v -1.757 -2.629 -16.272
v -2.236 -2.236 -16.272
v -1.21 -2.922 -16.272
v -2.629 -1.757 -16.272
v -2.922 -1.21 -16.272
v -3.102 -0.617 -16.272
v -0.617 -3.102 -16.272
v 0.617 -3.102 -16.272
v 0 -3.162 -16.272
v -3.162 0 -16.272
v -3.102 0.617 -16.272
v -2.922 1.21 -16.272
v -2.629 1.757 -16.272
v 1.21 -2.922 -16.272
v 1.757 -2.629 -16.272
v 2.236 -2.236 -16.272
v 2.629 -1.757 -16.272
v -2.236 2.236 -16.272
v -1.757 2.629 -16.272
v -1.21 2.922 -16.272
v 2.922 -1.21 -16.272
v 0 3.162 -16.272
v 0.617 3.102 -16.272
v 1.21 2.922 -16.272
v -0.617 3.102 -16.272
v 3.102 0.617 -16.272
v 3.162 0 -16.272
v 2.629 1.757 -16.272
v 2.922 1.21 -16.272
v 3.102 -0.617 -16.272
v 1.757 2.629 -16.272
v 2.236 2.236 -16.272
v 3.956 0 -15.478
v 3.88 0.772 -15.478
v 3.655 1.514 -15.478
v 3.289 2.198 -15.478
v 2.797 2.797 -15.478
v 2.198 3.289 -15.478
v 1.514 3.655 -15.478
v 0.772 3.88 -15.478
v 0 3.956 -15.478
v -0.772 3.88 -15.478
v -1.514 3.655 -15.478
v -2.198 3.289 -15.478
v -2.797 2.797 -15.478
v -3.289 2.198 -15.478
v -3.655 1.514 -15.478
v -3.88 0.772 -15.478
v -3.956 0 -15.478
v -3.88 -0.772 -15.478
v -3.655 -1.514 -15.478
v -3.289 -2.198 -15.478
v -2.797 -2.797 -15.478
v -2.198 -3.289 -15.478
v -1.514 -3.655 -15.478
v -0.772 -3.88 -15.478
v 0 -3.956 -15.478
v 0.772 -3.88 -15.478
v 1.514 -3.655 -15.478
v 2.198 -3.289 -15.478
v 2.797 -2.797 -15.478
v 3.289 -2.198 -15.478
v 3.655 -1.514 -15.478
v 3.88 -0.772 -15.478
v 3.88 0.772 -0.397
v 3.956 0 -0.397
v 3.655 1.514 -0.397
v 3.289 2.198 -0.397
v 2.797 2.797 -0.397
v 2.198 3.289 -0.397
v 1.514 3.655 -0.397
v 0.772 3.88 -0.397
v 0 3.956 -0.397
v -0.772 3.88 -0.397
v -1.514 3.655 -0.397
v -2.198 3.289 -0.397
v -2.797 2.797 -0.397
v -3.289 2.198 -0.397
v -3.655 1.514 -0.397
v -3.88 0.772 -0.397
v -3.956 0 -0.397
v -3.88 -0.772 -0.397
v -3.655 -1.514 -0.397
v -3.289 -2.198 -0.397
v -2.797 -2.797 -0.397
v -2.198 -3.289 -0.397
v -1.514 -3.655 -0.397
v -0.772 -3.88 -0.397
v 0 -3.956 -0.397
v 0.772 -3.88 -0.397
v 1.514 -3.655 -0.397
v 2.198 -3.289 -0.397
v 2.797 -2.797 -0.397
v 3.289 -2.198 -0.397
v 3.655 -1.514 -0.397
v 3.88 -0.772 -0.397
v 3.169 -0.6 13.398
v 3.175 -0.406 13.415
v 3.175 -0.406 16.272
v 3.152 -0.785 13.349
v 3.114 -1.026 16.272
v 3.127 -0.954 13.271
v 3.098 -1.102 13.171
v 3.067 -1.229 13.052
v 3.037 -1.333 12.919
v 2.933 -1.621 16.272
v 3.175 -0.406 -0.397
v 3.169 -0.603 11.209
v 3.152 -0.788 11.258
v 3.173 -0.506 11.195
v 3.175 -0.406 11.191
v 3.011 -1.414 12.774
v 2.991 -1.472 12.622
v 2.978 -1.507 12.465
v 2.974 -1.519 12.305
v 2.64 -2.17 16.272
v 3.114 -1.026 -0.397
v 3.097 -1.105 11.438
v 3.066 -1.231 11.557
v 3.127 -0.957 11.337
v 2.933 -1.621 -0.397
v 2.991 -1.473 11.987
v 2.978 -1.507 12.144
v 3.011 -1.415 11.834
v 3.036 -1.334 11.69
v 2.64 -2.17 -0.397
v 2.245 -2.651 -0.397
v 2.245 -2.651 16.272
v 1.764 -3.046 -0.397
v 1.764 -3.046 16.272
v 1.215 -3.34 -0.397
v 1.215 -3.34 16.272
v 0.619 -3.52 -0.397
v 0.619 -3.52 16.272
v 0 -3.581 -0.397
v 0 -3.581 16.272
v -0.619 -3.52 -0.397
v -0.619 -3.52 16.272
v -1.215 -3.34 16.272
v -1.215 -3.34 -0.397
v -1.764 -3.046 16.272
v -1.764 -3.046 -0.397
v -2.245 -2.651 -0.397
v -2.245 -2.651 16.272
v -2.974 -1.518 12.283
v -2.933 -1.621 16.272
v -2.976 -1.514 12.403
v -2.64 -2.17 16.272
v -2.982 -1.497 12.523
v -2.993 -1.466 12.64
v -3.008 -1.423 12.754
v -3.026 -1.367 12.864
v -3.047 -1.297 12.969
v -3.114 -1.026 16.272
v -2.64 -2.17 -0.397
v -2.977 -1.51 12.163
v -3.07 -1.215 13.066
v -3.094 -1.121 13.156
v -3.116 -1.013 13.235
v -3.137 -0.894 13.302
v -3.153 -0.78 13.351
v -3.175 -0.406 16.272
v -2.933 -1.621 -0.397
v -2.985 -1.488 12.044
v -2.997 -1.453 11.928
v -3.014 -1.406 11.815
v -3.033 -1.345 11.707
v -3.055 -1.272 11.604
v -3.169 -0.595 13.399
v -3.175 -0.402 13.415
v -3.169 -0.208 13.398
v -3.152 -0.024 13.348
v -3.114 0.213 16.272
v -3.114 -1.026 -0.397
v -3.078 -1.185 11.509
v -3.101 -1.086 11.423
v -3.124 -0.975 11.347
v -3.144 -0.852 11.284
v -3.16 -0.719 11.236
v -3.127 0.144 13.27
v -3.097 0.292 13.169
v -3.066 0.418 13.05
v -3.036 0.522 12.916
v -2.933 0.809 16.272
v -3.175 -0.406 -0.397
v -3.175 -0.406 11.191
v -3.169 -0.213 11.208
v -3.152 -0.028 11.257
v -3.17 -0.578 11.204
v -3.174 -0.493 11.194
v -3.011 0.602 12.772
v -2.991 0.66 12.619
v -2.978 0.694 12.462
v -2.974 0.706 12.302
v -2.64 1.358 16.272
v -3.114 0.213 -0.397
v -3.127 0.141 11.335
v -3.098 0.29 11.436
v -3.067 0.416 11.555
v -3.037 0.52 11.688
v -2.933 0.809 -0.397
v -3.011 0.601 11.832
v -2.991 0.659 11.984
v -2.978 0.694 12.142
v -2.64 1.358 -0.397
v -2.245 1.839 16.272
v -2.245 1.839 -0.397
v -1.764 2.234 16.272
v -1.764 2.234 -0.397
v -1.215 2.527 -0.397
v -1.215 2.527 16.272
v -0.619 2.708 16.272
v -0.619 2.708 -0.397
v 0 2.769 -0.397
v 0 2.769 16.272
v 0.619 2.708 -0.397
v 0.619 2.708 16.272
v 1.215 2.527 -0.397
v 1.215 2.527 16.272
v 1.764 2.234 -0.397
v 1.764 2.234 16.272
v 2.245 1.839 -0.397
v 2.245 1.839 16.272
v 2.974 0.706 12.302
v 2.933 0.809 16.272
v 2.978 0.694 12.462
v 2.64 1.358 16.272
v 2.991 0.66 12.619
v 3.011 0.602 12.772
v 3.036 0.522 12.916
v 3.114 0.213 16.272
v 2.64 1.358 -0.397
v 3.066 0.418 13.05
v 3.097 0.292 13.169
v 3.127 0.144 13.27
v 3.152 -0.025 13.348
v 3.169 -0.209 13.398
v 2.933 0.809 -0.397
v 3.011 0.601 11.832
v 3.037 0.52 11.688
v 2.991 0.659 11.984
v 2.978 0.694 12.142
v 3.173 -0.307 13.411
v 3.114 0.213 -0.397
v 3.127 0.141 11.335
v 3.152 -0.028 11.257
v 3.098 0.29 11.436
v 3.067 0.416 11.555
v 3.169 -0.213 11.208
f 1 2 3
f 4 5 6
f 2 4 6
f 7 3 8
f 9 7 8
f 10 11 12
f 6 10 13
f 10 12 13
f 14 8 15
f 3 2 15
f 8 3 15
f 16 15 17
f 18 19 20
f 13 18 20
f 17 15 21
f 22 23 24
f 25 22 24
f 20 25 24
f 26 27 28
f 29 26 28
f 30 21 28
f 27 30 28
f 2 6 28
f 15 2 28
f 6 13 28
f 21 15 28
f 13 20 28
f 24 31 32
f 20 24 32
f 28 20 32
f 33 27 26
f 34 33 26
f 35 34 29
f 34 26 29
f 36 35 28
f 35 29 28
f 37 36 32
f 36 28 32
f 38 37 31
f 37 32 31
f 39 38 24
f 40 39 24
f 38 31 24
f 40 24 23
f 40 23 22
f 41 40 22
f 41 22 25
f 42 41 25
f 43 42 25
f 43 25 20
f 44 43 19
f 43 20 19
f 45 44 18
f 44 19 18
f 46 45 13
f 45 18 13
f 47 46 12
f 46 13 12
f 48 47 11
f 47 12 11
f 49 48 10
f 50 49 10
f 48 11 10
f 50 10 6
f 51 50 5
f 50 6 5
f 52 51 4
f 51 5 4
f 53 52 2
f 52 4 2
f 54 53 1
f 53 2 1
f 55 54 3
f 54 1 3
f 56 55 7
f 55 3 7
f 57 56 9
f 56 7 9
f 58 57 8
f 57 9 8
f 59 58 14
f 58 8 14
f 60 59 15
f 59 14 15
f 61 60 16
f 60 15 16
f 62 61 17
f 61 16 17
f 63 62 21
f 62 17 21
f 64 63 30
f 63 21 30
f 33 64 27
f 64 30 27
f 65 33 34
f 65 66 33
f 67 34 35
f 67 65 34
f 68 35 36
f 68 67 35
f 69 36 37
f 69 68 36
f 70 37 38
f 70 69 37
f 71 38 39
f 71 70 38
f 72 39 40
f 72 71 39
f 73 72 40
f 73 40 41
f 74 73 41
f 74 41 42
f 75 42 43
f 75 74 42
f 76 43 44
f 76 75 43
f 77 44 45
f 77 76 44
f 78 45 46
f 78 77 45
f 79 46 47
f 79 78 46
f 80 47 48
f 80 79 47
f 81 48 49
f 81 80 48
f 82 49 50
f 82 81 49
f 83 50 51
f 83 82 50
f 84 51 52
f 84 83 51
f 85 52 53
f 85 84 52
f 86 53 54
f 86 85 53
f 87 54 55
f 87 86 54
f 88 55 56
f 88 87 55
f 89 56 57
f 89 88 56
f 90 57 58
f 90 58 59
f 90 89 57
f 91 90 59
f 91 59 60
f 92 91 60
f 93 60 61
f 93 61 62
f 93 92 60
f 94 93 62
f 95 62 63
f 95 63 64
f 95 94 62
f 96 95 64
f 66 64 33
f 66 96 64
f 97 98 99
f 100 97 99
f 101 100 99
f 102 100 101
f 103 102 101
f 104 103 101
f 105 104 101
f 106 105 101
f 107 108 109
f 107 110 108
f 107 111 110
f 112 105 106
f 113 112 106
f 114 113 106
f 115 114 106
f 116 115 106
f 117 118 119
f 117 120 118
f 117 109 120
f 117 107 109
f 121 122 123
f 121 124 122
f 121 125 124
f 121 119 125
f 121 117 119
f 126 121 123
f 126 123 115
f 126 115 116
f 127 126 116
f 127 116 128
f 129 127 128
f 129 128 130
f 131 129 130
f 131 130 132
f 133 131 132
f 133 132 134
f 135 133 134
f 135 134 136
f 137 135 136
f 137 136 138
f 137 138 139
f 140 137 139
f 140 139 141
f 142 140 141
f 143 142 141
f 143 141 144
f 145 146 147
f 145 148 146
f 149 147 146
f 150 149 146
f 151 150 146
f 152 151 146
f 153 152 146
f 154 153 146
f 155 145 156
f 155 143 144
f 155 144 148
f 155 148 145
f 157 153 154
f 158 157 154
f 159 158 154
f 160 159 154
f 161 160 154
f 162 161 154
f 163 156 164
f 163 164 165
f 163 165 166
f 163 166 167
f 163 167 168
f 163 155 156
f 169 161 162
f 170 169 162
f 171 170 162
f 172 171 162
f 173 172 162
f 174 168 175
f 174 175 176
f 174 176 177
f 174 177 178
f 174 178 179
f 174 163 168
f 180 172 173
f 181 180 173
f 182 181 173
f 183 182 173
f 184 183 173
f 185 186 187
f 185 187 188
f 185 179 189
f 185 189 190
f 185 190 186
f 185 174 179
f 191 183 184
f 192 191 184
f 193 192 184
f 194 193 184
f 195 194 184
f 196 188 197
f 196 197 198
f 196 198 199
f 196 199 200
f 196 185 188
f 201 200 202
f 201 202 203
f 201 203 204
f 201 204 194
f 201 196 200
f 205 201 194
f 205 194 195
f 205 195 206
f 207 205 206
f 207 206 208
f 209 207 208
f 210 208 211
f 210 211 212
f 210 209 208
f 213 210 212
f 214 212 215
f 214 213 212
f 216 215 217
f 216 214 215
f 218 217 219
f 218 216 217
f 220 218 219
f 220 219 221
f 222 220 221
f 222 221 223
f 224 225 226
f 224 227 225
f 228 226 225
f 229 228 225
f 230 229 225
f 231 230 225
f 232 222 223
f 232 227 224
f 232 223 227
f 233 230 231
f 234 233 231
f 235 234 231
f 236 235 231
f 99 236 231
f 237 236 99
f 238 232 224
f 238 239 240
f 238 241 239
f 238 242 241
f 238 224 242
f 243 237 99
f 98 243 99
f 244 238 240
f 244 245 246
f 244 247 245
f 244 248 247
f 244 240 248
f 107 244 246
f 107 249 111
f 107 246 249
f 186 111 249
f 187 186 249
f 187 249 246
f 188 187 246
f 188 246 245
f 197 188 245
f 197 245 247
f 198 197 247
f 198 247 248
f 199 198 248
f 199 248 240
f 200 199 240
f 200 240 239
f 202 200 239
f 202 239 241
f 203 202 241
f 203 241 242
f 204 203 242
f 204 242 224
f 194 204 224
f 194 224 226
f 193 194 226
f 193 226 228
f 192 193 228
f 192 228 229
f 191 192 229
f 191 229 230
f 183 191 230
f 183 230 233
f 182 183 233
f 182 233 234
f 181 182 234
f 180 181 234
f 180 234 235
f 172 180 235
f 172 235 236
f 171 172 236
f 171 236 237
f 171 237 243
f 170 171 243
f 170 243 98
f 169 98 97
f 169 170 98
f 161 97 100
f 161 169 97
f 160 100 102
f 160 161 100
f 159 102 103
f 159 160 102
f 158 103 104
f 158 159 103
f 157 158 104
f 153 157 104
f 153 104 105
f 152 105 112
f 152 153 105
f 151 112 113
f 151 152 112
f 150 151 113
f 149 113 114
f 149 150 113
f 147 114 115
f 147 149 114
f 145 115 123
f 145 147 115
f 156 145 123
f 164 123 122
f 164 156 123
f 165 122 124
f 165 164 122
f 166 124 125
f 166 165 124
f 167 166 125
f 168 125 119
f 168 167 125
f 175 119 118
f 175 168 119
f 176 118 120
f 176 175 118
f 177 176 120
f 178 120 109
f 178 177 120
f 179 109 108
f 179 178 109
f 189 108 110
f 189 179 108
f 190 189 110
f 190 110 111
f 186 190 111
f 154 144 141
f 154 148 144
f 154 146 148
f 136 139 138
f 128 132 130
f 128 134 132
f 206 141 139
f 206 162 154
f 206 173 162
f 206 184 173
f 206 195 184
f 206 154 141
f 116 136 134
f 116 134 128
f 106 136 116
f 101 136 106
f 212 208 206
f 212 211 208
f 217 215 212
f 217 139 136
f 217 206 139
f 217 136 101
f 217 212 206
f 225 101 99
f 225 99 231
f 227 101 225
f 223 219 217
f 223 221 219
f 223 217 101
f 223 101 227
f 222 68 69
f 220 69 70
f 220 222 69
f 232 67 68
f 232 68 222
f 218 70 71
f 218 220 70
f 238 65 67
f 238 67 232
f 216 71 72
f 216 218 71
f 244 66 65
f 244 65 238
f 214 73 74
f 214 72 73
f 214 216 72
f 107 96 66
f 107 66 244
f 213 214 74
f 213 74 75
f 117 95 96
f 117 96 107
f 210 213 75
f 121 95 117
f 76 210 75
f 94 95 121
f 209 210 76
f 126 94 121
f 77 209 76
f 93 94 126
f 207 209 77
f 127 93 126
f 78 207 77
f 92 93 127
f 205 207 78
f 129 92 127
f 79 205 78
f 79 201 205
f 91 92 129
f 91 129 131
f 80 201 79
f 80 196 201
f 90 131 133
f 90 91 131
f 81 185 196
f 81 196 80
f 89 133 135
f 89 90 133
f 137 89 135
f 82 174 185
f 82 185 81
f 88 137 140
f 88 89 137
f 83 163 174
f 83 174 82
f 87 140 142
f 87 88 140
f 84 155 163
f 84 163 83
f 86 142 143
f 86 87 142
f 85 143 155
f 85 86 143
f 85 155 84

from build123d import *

# Parameters (mm, degrees)
SKETCH1_R                   = 3.95605
BASE_EXTRUDE_DEPTH          = 16.271875
CHAMFER1_SIZE               = 0.79375
SILHOUETTE_W                = 16.66875
SILHOUETTE_H                = 1.18745
LOCKING_PIN_HOLE_DEPTH      = 18.206817812
LOCKING_PIN_HOLE_DEPTH_BACK = 18.206817812
SKETCH5_R                   = 1.112153358


with BuildPart() as part:
    # Sketch1 → Base-Extrude (new, symmetric)
    with BuildSketch(Plane.XY):
        Circle(SKETCH1_R)
    extrude(amount=BASE_EXTRUDE_DEPTH, both=True)

    # Chamfer1
    chamfer1_edges = [part.edges().sort_by_distance(p)[0] for p in [
        (-3.95605, 0, -16.271875),
    ]]
    chamfer(chamfer1_edges, length=CHAMFER1_SIZE)

    # Silhouette → Cut-Revolve1 (revolve, cut)
    with BuildSketch(Plane(origin=(0, 0, 0), x_dir=(0, 0, -1), z_dir=(1, 0, 0)), mode=Mode.PRIVATE) as cut_revolve1_sk:
        with Locations((-7.9375, 3.362325)):
            Rectangle(SILHOUETTE_W, SILHOUETTE_H)
    revolve(cut_revolve1_sk.sketch.rotate(Axis((0, -0.4064, 13.51559633), (0, 0, -1)), 90), axis=Axis((0, -0.4064, 13.51559633), (0, 0, -1)), mode=Mode.SUBTRACT)

    # Sketch5 → Locking pin hole (cut, two sides: drawn at the far end of the back side and taken through both)
    with BuildSketch(Plane(origin=(0, 0, 0), x_dir=(0, 0, -1), z_dir=(1, 0, 0)).offset(-LOCKING_PIN_HOLE_DEPTH_BACK)):
        with Locations((-12.303125, -0.4064)):
            Circle(SKETCH5_R)
    extrude(amount=LOCKING_PIN_HOLE_DEPTH + LOCKING_PIN_HOLE_DEPTH_BACK, mode=Mode.SUBTRACT)


solid = part.part
